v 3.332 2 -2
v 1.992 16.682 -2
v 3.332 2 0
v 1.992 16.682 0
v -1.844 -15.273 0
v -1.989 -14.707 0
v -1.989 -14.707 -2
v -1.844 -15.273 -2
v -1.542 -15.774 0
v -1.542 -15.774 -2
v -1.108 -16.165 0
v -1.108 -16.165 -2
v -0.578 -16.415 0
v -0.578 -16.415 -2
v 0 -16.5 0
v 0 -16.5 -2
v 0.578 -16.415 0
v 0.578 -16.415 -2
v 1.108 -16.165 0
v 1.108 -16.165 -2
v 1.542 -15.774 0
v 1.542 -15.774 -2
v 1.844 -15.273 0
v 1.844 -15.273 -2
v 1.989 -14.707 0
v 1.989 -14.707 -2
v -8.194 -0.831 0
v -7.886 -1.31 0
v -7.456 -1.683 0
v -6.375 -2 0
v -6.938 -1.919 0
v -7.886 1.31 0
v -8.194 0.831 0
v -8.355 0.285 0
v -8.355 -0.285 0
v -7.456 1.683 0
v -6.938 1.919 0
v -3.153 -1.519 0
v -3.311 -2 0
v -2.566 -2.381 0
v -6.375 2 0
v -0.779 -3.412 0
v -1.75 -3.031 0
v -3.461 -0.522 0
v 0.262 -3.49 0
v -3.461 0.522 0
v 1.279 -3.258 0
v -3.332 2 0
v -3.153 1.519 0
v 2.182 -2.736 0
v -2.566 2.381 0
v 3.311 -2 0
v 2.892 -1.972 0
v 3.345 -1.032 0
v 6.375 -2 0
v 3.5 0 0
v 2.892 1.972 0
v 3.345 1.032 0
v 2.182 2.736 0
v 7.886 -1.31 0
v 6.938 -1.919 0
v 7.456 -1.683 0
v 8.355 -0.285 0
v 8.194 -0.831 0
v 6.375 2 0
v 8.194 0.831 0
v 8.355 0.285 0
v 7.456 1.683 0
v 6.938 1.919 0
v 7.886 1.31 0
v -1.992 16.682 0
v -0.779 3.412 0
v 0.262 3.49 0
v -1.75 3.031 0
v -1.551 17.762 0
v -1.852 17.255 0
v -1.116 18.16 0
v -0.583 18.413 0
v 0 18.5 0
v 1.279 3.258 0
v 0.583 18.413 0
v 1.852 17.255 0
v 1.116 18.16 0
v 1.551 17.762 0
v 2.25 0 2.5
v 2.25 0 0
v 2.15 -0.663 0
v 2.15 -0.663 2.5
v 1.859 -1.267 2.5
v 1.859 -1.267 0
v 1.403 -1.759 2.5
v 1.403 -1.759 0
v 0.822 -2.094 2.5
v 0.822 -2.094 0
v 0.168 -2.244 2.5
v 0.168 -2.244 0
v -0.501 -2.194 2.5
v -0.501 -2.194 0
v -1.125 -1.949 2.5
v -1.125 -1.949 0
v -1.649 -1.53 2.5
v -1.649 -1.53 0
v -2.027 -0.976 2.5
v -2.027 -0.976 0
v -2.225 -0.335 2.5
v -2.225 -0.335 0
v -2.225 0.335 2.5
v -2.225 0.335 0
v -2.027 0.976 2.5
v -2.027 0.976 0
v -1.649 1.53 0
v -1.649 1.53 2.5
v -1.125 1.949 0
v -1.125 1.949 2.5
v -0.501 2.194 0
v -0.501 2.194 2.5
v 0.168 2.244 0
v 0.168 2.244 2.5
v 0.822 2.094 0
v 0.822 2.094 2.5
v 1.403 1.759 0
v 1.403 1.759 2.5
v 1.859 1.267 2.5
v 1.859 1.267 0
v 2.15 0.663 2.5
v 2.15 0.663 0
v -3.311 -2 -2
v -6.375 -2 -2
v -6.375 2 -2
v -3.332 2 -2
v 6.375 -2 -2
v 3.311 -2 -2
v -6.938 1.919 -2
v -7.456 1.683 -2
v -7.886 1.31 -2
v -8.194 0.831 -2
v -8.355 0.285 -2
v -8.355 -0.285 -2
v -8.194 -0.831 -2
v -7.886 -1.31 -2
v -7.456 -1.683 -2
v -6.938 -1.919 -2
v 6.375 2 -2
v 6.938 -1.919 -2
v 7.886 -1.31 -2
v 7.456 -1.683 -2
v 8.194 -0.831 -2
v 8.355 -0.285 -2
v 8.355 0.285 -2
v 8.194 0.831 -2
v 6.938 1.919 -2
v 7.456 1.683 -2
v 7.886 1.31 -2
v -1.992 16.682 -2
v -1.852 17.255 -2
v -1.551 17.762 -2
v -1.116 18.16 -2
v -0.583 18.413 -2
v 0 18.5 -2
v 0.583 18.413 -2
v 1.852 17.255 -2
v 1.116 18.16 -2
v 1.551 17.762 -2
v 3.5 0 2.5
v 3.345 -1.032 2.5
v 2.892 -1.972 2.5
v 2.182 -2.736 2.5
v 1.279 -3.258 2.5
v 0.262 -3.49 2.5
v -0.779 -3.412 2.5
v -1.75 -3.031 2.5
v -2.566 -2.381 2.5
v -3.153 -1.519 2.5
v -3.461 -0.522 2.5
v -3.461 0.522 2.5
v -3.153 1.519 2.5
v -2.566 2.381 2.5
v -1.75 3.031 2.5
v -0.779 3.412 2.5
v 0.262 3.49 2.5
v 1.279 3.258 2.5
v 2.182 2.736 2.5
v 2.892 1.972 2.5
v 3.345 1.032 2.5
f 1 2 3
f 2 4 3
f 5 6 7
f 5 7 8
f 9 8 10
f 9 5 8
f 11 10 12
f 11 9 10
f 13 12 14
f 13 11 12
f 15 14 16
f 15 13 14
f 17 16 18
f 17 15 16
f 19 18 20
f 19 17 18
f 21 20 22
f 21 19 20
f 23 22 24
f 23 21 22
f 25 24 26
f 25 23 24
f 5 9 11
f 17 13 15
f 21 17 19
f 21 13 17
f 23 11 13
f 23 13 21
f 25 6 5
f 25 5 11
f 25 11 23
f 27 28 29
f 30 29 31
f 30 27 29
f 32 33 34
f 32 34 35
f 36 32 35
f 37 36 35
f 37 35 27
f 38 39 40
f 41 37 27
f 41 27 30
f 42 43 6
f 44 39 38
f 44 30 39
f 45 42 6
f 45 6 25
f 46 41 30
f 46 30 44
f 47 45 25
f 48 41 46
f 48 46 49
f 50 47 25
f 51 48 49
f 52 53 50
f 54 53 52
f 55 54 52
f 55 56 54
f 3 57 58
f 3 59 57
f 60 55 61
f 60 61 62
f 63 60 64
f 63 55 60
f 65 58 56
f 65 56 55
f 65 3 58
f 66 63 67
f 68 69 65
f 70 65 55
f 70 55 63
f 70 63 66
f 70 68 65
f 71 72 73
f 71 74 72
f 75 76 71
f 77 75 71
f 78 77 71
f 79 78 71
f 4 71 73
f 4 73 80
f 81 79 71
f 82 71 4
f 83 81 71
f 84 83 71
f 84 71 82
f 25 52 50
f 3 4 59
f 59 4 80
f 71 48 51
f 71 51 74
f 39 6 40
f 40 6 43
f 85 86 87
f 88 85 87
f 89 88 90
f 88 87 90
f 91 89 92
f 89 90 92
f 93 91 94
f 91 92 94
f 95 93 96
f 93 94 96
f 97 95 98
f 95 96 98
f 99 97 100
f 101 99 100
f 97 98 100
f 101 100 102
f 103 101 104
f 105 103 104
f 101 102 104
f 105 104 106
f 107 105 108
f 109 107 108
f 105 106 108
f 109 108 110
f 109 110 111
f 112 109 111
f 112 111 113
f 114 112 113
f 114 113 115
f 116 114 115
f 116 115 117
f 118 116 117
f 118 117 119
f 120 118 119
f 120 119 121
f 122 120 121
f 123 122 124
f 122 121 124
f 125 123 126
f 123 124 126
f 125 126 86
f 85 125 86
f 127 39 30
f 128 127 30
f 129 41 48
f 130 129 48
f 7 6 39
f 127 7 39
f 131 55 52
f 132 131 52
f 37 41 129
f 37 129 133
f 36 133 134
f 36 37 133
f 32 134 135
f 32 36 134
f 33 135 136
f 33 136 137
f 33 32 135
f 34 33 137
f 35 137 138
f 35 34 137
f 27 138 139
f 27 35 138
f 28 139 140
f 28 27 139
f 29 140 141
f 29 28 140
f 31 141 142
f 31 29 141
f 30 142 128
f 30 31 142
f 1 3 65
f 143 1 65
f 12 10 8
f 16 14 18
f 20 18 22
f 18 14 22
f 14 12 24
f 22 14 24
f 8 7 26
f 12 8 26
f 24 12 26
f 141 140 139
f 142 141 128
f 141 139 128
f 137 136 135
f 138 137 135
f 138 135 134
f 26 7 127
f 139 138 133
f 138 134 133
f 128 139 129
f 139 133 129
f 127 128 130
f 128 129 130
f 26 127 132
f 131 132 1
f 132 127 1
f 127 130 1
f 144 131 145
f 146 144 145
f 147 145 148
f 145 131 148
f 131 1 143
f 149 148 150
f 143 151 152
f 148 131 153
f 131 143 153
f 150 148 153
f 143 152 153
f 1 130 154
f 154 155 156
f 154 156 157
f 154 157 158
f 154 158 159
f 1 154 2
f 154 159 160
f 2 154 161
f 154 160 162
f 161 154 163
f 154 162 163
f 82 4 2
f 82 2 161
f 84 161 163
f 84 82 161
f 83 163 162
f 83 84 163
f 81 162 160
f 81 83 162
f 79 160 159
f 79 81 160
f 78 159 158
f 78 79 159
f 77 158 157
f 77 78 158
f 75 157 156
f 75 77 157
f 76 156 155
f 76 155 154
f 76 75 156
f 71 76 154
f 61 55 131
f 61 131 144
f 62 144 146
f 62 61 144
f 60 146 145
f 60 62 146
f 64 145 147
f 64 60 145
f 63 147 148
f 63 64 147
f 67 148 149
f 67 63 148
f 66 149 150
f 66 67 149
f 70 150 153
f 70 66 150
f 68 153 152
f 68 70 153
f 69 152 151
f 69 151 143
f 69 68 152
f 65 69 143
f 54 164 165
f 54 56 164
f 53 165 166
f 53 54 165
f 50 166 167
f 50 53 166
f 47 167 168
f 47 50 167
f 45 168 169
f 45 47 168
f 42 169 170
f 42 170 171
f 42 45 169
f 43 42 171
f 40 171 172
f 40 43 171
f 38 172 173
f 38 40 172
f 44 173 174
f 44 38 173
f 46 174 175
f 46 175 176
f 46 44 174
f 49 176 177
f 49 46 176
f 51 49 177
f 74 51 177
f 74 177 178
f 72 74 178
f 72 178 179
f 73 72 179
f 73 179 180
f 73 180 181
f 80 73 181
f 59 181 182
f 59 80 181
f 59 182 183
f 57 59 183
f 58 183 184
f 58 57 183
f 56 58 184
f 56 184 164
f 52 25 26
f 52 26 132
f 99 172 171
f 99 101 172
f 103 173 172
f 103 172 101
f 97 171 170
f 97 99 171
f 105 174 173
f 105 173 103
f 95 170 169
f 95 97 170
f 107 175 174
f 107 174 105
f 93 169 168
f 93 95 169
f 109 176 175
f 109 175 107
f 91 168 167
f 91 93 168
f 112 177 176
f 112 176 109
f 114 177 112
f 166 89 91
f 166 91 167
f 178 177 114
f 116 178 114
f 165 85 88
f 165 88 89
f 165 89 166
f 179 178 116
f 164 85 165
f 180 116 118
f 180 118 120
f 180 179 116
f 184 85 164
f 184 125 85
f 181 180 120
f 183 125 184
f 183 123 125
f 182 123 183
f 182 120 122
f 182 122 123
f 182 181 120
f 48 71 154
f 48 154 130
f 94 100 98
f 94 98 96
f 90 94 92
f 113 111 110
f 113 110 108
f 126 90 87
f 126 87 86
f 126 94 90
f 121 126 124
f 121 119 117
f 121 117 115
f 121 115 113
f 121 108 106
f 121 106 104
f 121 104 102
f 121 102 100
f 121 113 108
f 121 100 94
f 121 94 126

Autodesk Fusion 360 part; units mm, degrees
sketch "Sketch1" plane through (0, 0, 0) normal (0, 0, 1) x (1, 0, 0)
  circle A0 centre (0, 0) radius 3.5
  circle A1 centre (0, 0) radius 2.25
  circle A2 centre (0, 16.5) radius 2
  circle A3 centre (0, -14.5) radius 2
  circle A4 centre (-6.375, 0) radius 2
  circle A5 centre (6.375, 0) radius 2
  line L0 (0, 0) -> (0, 16.5) construction
  line L1 (-1.9917, 16.6818) -> (-3.4855, 0.3182)
  line L2 (-1.9893, -14.7069) -> (-3.4812, -0.3621)
  line L3 (1.9917, 16.6818) -> (3.4855, 0.3182)
  line L4 (1.9893, -14.7069) -> (3.4812, -0.3621)
  line L5 (-6.375, 2) -> (6.375, 2)
  line L6 (6.375, 2) -> (6.375, -2) construction
  line L7 (6.375, -2) -> (-6.375, -2)
  line L8 (-6.375, -2) -> (-6.375, 2) construction
  circle A6 centre (0, 0) radius 1.25
  circle A7 centre (0, 5) radius 0.625
  circle A8 centre (0, -5) radius 0.625
  point P0 (0, -16.5)
  point P1 (0, 18.5)
  point P2 (-8.375, 0)
  point P3 (8.375, 0)
  dimension "d1" = 7
  dimension "d2" = 4.5
  dimension "d5" = 35
  dimension "d7" = 4
  dimension "d8" = 16.75
  dimension "d9" = 14.5
  dimension "d12" = 2.5
  dimension "d14" = 5
  dimension "d15" = 1.25
  dimension "d22" = 5
extrude "Extrude1" add sketch "Sketch1" along normal blind 2.5 contours A0 A1 L5 L7 | A0 A1 L5 | A0 A1 L7 | A0 A1 L5 L7
extrude "Extrude2" add sketch "Sketch1" against normal blind 2 contours A0 A1 L5 L7 | A0 A5 L3 L4 L5 L7 | A0 L3 L5 | A0 L4 L7 | A0 A1 L5 | A0 A2 L1 L3 L5 | A0 A3 L2 L4 L7 | A0 A1 L7 | A0 A1 L5 L7 | A0 L1 L5 | A1 L5 | A1 L5 L7 | A2 | A5 | A0 L2 L7 | A1 L7 | A3 | A0 A4 L1 L2 L5 L7 | A4 | A6 | A7 | A8
extrude "Extrude4" cut sketch "Sketch1" along normal through all contours A7
pattern_linear "R-Pattern1" count 7 spacing 2 along (0, 1, 0) of "Extrude4"
extrude "Extrude5" cut sketch "Sketch1" along normal through all contours A8
pattern_linear "R-Pattern2" count 6 spacing 2 along (0, -1, 0) of "Extrude5"
extrude "Extrude6" cut sketch "Sketch1" along normal through all contours A6
